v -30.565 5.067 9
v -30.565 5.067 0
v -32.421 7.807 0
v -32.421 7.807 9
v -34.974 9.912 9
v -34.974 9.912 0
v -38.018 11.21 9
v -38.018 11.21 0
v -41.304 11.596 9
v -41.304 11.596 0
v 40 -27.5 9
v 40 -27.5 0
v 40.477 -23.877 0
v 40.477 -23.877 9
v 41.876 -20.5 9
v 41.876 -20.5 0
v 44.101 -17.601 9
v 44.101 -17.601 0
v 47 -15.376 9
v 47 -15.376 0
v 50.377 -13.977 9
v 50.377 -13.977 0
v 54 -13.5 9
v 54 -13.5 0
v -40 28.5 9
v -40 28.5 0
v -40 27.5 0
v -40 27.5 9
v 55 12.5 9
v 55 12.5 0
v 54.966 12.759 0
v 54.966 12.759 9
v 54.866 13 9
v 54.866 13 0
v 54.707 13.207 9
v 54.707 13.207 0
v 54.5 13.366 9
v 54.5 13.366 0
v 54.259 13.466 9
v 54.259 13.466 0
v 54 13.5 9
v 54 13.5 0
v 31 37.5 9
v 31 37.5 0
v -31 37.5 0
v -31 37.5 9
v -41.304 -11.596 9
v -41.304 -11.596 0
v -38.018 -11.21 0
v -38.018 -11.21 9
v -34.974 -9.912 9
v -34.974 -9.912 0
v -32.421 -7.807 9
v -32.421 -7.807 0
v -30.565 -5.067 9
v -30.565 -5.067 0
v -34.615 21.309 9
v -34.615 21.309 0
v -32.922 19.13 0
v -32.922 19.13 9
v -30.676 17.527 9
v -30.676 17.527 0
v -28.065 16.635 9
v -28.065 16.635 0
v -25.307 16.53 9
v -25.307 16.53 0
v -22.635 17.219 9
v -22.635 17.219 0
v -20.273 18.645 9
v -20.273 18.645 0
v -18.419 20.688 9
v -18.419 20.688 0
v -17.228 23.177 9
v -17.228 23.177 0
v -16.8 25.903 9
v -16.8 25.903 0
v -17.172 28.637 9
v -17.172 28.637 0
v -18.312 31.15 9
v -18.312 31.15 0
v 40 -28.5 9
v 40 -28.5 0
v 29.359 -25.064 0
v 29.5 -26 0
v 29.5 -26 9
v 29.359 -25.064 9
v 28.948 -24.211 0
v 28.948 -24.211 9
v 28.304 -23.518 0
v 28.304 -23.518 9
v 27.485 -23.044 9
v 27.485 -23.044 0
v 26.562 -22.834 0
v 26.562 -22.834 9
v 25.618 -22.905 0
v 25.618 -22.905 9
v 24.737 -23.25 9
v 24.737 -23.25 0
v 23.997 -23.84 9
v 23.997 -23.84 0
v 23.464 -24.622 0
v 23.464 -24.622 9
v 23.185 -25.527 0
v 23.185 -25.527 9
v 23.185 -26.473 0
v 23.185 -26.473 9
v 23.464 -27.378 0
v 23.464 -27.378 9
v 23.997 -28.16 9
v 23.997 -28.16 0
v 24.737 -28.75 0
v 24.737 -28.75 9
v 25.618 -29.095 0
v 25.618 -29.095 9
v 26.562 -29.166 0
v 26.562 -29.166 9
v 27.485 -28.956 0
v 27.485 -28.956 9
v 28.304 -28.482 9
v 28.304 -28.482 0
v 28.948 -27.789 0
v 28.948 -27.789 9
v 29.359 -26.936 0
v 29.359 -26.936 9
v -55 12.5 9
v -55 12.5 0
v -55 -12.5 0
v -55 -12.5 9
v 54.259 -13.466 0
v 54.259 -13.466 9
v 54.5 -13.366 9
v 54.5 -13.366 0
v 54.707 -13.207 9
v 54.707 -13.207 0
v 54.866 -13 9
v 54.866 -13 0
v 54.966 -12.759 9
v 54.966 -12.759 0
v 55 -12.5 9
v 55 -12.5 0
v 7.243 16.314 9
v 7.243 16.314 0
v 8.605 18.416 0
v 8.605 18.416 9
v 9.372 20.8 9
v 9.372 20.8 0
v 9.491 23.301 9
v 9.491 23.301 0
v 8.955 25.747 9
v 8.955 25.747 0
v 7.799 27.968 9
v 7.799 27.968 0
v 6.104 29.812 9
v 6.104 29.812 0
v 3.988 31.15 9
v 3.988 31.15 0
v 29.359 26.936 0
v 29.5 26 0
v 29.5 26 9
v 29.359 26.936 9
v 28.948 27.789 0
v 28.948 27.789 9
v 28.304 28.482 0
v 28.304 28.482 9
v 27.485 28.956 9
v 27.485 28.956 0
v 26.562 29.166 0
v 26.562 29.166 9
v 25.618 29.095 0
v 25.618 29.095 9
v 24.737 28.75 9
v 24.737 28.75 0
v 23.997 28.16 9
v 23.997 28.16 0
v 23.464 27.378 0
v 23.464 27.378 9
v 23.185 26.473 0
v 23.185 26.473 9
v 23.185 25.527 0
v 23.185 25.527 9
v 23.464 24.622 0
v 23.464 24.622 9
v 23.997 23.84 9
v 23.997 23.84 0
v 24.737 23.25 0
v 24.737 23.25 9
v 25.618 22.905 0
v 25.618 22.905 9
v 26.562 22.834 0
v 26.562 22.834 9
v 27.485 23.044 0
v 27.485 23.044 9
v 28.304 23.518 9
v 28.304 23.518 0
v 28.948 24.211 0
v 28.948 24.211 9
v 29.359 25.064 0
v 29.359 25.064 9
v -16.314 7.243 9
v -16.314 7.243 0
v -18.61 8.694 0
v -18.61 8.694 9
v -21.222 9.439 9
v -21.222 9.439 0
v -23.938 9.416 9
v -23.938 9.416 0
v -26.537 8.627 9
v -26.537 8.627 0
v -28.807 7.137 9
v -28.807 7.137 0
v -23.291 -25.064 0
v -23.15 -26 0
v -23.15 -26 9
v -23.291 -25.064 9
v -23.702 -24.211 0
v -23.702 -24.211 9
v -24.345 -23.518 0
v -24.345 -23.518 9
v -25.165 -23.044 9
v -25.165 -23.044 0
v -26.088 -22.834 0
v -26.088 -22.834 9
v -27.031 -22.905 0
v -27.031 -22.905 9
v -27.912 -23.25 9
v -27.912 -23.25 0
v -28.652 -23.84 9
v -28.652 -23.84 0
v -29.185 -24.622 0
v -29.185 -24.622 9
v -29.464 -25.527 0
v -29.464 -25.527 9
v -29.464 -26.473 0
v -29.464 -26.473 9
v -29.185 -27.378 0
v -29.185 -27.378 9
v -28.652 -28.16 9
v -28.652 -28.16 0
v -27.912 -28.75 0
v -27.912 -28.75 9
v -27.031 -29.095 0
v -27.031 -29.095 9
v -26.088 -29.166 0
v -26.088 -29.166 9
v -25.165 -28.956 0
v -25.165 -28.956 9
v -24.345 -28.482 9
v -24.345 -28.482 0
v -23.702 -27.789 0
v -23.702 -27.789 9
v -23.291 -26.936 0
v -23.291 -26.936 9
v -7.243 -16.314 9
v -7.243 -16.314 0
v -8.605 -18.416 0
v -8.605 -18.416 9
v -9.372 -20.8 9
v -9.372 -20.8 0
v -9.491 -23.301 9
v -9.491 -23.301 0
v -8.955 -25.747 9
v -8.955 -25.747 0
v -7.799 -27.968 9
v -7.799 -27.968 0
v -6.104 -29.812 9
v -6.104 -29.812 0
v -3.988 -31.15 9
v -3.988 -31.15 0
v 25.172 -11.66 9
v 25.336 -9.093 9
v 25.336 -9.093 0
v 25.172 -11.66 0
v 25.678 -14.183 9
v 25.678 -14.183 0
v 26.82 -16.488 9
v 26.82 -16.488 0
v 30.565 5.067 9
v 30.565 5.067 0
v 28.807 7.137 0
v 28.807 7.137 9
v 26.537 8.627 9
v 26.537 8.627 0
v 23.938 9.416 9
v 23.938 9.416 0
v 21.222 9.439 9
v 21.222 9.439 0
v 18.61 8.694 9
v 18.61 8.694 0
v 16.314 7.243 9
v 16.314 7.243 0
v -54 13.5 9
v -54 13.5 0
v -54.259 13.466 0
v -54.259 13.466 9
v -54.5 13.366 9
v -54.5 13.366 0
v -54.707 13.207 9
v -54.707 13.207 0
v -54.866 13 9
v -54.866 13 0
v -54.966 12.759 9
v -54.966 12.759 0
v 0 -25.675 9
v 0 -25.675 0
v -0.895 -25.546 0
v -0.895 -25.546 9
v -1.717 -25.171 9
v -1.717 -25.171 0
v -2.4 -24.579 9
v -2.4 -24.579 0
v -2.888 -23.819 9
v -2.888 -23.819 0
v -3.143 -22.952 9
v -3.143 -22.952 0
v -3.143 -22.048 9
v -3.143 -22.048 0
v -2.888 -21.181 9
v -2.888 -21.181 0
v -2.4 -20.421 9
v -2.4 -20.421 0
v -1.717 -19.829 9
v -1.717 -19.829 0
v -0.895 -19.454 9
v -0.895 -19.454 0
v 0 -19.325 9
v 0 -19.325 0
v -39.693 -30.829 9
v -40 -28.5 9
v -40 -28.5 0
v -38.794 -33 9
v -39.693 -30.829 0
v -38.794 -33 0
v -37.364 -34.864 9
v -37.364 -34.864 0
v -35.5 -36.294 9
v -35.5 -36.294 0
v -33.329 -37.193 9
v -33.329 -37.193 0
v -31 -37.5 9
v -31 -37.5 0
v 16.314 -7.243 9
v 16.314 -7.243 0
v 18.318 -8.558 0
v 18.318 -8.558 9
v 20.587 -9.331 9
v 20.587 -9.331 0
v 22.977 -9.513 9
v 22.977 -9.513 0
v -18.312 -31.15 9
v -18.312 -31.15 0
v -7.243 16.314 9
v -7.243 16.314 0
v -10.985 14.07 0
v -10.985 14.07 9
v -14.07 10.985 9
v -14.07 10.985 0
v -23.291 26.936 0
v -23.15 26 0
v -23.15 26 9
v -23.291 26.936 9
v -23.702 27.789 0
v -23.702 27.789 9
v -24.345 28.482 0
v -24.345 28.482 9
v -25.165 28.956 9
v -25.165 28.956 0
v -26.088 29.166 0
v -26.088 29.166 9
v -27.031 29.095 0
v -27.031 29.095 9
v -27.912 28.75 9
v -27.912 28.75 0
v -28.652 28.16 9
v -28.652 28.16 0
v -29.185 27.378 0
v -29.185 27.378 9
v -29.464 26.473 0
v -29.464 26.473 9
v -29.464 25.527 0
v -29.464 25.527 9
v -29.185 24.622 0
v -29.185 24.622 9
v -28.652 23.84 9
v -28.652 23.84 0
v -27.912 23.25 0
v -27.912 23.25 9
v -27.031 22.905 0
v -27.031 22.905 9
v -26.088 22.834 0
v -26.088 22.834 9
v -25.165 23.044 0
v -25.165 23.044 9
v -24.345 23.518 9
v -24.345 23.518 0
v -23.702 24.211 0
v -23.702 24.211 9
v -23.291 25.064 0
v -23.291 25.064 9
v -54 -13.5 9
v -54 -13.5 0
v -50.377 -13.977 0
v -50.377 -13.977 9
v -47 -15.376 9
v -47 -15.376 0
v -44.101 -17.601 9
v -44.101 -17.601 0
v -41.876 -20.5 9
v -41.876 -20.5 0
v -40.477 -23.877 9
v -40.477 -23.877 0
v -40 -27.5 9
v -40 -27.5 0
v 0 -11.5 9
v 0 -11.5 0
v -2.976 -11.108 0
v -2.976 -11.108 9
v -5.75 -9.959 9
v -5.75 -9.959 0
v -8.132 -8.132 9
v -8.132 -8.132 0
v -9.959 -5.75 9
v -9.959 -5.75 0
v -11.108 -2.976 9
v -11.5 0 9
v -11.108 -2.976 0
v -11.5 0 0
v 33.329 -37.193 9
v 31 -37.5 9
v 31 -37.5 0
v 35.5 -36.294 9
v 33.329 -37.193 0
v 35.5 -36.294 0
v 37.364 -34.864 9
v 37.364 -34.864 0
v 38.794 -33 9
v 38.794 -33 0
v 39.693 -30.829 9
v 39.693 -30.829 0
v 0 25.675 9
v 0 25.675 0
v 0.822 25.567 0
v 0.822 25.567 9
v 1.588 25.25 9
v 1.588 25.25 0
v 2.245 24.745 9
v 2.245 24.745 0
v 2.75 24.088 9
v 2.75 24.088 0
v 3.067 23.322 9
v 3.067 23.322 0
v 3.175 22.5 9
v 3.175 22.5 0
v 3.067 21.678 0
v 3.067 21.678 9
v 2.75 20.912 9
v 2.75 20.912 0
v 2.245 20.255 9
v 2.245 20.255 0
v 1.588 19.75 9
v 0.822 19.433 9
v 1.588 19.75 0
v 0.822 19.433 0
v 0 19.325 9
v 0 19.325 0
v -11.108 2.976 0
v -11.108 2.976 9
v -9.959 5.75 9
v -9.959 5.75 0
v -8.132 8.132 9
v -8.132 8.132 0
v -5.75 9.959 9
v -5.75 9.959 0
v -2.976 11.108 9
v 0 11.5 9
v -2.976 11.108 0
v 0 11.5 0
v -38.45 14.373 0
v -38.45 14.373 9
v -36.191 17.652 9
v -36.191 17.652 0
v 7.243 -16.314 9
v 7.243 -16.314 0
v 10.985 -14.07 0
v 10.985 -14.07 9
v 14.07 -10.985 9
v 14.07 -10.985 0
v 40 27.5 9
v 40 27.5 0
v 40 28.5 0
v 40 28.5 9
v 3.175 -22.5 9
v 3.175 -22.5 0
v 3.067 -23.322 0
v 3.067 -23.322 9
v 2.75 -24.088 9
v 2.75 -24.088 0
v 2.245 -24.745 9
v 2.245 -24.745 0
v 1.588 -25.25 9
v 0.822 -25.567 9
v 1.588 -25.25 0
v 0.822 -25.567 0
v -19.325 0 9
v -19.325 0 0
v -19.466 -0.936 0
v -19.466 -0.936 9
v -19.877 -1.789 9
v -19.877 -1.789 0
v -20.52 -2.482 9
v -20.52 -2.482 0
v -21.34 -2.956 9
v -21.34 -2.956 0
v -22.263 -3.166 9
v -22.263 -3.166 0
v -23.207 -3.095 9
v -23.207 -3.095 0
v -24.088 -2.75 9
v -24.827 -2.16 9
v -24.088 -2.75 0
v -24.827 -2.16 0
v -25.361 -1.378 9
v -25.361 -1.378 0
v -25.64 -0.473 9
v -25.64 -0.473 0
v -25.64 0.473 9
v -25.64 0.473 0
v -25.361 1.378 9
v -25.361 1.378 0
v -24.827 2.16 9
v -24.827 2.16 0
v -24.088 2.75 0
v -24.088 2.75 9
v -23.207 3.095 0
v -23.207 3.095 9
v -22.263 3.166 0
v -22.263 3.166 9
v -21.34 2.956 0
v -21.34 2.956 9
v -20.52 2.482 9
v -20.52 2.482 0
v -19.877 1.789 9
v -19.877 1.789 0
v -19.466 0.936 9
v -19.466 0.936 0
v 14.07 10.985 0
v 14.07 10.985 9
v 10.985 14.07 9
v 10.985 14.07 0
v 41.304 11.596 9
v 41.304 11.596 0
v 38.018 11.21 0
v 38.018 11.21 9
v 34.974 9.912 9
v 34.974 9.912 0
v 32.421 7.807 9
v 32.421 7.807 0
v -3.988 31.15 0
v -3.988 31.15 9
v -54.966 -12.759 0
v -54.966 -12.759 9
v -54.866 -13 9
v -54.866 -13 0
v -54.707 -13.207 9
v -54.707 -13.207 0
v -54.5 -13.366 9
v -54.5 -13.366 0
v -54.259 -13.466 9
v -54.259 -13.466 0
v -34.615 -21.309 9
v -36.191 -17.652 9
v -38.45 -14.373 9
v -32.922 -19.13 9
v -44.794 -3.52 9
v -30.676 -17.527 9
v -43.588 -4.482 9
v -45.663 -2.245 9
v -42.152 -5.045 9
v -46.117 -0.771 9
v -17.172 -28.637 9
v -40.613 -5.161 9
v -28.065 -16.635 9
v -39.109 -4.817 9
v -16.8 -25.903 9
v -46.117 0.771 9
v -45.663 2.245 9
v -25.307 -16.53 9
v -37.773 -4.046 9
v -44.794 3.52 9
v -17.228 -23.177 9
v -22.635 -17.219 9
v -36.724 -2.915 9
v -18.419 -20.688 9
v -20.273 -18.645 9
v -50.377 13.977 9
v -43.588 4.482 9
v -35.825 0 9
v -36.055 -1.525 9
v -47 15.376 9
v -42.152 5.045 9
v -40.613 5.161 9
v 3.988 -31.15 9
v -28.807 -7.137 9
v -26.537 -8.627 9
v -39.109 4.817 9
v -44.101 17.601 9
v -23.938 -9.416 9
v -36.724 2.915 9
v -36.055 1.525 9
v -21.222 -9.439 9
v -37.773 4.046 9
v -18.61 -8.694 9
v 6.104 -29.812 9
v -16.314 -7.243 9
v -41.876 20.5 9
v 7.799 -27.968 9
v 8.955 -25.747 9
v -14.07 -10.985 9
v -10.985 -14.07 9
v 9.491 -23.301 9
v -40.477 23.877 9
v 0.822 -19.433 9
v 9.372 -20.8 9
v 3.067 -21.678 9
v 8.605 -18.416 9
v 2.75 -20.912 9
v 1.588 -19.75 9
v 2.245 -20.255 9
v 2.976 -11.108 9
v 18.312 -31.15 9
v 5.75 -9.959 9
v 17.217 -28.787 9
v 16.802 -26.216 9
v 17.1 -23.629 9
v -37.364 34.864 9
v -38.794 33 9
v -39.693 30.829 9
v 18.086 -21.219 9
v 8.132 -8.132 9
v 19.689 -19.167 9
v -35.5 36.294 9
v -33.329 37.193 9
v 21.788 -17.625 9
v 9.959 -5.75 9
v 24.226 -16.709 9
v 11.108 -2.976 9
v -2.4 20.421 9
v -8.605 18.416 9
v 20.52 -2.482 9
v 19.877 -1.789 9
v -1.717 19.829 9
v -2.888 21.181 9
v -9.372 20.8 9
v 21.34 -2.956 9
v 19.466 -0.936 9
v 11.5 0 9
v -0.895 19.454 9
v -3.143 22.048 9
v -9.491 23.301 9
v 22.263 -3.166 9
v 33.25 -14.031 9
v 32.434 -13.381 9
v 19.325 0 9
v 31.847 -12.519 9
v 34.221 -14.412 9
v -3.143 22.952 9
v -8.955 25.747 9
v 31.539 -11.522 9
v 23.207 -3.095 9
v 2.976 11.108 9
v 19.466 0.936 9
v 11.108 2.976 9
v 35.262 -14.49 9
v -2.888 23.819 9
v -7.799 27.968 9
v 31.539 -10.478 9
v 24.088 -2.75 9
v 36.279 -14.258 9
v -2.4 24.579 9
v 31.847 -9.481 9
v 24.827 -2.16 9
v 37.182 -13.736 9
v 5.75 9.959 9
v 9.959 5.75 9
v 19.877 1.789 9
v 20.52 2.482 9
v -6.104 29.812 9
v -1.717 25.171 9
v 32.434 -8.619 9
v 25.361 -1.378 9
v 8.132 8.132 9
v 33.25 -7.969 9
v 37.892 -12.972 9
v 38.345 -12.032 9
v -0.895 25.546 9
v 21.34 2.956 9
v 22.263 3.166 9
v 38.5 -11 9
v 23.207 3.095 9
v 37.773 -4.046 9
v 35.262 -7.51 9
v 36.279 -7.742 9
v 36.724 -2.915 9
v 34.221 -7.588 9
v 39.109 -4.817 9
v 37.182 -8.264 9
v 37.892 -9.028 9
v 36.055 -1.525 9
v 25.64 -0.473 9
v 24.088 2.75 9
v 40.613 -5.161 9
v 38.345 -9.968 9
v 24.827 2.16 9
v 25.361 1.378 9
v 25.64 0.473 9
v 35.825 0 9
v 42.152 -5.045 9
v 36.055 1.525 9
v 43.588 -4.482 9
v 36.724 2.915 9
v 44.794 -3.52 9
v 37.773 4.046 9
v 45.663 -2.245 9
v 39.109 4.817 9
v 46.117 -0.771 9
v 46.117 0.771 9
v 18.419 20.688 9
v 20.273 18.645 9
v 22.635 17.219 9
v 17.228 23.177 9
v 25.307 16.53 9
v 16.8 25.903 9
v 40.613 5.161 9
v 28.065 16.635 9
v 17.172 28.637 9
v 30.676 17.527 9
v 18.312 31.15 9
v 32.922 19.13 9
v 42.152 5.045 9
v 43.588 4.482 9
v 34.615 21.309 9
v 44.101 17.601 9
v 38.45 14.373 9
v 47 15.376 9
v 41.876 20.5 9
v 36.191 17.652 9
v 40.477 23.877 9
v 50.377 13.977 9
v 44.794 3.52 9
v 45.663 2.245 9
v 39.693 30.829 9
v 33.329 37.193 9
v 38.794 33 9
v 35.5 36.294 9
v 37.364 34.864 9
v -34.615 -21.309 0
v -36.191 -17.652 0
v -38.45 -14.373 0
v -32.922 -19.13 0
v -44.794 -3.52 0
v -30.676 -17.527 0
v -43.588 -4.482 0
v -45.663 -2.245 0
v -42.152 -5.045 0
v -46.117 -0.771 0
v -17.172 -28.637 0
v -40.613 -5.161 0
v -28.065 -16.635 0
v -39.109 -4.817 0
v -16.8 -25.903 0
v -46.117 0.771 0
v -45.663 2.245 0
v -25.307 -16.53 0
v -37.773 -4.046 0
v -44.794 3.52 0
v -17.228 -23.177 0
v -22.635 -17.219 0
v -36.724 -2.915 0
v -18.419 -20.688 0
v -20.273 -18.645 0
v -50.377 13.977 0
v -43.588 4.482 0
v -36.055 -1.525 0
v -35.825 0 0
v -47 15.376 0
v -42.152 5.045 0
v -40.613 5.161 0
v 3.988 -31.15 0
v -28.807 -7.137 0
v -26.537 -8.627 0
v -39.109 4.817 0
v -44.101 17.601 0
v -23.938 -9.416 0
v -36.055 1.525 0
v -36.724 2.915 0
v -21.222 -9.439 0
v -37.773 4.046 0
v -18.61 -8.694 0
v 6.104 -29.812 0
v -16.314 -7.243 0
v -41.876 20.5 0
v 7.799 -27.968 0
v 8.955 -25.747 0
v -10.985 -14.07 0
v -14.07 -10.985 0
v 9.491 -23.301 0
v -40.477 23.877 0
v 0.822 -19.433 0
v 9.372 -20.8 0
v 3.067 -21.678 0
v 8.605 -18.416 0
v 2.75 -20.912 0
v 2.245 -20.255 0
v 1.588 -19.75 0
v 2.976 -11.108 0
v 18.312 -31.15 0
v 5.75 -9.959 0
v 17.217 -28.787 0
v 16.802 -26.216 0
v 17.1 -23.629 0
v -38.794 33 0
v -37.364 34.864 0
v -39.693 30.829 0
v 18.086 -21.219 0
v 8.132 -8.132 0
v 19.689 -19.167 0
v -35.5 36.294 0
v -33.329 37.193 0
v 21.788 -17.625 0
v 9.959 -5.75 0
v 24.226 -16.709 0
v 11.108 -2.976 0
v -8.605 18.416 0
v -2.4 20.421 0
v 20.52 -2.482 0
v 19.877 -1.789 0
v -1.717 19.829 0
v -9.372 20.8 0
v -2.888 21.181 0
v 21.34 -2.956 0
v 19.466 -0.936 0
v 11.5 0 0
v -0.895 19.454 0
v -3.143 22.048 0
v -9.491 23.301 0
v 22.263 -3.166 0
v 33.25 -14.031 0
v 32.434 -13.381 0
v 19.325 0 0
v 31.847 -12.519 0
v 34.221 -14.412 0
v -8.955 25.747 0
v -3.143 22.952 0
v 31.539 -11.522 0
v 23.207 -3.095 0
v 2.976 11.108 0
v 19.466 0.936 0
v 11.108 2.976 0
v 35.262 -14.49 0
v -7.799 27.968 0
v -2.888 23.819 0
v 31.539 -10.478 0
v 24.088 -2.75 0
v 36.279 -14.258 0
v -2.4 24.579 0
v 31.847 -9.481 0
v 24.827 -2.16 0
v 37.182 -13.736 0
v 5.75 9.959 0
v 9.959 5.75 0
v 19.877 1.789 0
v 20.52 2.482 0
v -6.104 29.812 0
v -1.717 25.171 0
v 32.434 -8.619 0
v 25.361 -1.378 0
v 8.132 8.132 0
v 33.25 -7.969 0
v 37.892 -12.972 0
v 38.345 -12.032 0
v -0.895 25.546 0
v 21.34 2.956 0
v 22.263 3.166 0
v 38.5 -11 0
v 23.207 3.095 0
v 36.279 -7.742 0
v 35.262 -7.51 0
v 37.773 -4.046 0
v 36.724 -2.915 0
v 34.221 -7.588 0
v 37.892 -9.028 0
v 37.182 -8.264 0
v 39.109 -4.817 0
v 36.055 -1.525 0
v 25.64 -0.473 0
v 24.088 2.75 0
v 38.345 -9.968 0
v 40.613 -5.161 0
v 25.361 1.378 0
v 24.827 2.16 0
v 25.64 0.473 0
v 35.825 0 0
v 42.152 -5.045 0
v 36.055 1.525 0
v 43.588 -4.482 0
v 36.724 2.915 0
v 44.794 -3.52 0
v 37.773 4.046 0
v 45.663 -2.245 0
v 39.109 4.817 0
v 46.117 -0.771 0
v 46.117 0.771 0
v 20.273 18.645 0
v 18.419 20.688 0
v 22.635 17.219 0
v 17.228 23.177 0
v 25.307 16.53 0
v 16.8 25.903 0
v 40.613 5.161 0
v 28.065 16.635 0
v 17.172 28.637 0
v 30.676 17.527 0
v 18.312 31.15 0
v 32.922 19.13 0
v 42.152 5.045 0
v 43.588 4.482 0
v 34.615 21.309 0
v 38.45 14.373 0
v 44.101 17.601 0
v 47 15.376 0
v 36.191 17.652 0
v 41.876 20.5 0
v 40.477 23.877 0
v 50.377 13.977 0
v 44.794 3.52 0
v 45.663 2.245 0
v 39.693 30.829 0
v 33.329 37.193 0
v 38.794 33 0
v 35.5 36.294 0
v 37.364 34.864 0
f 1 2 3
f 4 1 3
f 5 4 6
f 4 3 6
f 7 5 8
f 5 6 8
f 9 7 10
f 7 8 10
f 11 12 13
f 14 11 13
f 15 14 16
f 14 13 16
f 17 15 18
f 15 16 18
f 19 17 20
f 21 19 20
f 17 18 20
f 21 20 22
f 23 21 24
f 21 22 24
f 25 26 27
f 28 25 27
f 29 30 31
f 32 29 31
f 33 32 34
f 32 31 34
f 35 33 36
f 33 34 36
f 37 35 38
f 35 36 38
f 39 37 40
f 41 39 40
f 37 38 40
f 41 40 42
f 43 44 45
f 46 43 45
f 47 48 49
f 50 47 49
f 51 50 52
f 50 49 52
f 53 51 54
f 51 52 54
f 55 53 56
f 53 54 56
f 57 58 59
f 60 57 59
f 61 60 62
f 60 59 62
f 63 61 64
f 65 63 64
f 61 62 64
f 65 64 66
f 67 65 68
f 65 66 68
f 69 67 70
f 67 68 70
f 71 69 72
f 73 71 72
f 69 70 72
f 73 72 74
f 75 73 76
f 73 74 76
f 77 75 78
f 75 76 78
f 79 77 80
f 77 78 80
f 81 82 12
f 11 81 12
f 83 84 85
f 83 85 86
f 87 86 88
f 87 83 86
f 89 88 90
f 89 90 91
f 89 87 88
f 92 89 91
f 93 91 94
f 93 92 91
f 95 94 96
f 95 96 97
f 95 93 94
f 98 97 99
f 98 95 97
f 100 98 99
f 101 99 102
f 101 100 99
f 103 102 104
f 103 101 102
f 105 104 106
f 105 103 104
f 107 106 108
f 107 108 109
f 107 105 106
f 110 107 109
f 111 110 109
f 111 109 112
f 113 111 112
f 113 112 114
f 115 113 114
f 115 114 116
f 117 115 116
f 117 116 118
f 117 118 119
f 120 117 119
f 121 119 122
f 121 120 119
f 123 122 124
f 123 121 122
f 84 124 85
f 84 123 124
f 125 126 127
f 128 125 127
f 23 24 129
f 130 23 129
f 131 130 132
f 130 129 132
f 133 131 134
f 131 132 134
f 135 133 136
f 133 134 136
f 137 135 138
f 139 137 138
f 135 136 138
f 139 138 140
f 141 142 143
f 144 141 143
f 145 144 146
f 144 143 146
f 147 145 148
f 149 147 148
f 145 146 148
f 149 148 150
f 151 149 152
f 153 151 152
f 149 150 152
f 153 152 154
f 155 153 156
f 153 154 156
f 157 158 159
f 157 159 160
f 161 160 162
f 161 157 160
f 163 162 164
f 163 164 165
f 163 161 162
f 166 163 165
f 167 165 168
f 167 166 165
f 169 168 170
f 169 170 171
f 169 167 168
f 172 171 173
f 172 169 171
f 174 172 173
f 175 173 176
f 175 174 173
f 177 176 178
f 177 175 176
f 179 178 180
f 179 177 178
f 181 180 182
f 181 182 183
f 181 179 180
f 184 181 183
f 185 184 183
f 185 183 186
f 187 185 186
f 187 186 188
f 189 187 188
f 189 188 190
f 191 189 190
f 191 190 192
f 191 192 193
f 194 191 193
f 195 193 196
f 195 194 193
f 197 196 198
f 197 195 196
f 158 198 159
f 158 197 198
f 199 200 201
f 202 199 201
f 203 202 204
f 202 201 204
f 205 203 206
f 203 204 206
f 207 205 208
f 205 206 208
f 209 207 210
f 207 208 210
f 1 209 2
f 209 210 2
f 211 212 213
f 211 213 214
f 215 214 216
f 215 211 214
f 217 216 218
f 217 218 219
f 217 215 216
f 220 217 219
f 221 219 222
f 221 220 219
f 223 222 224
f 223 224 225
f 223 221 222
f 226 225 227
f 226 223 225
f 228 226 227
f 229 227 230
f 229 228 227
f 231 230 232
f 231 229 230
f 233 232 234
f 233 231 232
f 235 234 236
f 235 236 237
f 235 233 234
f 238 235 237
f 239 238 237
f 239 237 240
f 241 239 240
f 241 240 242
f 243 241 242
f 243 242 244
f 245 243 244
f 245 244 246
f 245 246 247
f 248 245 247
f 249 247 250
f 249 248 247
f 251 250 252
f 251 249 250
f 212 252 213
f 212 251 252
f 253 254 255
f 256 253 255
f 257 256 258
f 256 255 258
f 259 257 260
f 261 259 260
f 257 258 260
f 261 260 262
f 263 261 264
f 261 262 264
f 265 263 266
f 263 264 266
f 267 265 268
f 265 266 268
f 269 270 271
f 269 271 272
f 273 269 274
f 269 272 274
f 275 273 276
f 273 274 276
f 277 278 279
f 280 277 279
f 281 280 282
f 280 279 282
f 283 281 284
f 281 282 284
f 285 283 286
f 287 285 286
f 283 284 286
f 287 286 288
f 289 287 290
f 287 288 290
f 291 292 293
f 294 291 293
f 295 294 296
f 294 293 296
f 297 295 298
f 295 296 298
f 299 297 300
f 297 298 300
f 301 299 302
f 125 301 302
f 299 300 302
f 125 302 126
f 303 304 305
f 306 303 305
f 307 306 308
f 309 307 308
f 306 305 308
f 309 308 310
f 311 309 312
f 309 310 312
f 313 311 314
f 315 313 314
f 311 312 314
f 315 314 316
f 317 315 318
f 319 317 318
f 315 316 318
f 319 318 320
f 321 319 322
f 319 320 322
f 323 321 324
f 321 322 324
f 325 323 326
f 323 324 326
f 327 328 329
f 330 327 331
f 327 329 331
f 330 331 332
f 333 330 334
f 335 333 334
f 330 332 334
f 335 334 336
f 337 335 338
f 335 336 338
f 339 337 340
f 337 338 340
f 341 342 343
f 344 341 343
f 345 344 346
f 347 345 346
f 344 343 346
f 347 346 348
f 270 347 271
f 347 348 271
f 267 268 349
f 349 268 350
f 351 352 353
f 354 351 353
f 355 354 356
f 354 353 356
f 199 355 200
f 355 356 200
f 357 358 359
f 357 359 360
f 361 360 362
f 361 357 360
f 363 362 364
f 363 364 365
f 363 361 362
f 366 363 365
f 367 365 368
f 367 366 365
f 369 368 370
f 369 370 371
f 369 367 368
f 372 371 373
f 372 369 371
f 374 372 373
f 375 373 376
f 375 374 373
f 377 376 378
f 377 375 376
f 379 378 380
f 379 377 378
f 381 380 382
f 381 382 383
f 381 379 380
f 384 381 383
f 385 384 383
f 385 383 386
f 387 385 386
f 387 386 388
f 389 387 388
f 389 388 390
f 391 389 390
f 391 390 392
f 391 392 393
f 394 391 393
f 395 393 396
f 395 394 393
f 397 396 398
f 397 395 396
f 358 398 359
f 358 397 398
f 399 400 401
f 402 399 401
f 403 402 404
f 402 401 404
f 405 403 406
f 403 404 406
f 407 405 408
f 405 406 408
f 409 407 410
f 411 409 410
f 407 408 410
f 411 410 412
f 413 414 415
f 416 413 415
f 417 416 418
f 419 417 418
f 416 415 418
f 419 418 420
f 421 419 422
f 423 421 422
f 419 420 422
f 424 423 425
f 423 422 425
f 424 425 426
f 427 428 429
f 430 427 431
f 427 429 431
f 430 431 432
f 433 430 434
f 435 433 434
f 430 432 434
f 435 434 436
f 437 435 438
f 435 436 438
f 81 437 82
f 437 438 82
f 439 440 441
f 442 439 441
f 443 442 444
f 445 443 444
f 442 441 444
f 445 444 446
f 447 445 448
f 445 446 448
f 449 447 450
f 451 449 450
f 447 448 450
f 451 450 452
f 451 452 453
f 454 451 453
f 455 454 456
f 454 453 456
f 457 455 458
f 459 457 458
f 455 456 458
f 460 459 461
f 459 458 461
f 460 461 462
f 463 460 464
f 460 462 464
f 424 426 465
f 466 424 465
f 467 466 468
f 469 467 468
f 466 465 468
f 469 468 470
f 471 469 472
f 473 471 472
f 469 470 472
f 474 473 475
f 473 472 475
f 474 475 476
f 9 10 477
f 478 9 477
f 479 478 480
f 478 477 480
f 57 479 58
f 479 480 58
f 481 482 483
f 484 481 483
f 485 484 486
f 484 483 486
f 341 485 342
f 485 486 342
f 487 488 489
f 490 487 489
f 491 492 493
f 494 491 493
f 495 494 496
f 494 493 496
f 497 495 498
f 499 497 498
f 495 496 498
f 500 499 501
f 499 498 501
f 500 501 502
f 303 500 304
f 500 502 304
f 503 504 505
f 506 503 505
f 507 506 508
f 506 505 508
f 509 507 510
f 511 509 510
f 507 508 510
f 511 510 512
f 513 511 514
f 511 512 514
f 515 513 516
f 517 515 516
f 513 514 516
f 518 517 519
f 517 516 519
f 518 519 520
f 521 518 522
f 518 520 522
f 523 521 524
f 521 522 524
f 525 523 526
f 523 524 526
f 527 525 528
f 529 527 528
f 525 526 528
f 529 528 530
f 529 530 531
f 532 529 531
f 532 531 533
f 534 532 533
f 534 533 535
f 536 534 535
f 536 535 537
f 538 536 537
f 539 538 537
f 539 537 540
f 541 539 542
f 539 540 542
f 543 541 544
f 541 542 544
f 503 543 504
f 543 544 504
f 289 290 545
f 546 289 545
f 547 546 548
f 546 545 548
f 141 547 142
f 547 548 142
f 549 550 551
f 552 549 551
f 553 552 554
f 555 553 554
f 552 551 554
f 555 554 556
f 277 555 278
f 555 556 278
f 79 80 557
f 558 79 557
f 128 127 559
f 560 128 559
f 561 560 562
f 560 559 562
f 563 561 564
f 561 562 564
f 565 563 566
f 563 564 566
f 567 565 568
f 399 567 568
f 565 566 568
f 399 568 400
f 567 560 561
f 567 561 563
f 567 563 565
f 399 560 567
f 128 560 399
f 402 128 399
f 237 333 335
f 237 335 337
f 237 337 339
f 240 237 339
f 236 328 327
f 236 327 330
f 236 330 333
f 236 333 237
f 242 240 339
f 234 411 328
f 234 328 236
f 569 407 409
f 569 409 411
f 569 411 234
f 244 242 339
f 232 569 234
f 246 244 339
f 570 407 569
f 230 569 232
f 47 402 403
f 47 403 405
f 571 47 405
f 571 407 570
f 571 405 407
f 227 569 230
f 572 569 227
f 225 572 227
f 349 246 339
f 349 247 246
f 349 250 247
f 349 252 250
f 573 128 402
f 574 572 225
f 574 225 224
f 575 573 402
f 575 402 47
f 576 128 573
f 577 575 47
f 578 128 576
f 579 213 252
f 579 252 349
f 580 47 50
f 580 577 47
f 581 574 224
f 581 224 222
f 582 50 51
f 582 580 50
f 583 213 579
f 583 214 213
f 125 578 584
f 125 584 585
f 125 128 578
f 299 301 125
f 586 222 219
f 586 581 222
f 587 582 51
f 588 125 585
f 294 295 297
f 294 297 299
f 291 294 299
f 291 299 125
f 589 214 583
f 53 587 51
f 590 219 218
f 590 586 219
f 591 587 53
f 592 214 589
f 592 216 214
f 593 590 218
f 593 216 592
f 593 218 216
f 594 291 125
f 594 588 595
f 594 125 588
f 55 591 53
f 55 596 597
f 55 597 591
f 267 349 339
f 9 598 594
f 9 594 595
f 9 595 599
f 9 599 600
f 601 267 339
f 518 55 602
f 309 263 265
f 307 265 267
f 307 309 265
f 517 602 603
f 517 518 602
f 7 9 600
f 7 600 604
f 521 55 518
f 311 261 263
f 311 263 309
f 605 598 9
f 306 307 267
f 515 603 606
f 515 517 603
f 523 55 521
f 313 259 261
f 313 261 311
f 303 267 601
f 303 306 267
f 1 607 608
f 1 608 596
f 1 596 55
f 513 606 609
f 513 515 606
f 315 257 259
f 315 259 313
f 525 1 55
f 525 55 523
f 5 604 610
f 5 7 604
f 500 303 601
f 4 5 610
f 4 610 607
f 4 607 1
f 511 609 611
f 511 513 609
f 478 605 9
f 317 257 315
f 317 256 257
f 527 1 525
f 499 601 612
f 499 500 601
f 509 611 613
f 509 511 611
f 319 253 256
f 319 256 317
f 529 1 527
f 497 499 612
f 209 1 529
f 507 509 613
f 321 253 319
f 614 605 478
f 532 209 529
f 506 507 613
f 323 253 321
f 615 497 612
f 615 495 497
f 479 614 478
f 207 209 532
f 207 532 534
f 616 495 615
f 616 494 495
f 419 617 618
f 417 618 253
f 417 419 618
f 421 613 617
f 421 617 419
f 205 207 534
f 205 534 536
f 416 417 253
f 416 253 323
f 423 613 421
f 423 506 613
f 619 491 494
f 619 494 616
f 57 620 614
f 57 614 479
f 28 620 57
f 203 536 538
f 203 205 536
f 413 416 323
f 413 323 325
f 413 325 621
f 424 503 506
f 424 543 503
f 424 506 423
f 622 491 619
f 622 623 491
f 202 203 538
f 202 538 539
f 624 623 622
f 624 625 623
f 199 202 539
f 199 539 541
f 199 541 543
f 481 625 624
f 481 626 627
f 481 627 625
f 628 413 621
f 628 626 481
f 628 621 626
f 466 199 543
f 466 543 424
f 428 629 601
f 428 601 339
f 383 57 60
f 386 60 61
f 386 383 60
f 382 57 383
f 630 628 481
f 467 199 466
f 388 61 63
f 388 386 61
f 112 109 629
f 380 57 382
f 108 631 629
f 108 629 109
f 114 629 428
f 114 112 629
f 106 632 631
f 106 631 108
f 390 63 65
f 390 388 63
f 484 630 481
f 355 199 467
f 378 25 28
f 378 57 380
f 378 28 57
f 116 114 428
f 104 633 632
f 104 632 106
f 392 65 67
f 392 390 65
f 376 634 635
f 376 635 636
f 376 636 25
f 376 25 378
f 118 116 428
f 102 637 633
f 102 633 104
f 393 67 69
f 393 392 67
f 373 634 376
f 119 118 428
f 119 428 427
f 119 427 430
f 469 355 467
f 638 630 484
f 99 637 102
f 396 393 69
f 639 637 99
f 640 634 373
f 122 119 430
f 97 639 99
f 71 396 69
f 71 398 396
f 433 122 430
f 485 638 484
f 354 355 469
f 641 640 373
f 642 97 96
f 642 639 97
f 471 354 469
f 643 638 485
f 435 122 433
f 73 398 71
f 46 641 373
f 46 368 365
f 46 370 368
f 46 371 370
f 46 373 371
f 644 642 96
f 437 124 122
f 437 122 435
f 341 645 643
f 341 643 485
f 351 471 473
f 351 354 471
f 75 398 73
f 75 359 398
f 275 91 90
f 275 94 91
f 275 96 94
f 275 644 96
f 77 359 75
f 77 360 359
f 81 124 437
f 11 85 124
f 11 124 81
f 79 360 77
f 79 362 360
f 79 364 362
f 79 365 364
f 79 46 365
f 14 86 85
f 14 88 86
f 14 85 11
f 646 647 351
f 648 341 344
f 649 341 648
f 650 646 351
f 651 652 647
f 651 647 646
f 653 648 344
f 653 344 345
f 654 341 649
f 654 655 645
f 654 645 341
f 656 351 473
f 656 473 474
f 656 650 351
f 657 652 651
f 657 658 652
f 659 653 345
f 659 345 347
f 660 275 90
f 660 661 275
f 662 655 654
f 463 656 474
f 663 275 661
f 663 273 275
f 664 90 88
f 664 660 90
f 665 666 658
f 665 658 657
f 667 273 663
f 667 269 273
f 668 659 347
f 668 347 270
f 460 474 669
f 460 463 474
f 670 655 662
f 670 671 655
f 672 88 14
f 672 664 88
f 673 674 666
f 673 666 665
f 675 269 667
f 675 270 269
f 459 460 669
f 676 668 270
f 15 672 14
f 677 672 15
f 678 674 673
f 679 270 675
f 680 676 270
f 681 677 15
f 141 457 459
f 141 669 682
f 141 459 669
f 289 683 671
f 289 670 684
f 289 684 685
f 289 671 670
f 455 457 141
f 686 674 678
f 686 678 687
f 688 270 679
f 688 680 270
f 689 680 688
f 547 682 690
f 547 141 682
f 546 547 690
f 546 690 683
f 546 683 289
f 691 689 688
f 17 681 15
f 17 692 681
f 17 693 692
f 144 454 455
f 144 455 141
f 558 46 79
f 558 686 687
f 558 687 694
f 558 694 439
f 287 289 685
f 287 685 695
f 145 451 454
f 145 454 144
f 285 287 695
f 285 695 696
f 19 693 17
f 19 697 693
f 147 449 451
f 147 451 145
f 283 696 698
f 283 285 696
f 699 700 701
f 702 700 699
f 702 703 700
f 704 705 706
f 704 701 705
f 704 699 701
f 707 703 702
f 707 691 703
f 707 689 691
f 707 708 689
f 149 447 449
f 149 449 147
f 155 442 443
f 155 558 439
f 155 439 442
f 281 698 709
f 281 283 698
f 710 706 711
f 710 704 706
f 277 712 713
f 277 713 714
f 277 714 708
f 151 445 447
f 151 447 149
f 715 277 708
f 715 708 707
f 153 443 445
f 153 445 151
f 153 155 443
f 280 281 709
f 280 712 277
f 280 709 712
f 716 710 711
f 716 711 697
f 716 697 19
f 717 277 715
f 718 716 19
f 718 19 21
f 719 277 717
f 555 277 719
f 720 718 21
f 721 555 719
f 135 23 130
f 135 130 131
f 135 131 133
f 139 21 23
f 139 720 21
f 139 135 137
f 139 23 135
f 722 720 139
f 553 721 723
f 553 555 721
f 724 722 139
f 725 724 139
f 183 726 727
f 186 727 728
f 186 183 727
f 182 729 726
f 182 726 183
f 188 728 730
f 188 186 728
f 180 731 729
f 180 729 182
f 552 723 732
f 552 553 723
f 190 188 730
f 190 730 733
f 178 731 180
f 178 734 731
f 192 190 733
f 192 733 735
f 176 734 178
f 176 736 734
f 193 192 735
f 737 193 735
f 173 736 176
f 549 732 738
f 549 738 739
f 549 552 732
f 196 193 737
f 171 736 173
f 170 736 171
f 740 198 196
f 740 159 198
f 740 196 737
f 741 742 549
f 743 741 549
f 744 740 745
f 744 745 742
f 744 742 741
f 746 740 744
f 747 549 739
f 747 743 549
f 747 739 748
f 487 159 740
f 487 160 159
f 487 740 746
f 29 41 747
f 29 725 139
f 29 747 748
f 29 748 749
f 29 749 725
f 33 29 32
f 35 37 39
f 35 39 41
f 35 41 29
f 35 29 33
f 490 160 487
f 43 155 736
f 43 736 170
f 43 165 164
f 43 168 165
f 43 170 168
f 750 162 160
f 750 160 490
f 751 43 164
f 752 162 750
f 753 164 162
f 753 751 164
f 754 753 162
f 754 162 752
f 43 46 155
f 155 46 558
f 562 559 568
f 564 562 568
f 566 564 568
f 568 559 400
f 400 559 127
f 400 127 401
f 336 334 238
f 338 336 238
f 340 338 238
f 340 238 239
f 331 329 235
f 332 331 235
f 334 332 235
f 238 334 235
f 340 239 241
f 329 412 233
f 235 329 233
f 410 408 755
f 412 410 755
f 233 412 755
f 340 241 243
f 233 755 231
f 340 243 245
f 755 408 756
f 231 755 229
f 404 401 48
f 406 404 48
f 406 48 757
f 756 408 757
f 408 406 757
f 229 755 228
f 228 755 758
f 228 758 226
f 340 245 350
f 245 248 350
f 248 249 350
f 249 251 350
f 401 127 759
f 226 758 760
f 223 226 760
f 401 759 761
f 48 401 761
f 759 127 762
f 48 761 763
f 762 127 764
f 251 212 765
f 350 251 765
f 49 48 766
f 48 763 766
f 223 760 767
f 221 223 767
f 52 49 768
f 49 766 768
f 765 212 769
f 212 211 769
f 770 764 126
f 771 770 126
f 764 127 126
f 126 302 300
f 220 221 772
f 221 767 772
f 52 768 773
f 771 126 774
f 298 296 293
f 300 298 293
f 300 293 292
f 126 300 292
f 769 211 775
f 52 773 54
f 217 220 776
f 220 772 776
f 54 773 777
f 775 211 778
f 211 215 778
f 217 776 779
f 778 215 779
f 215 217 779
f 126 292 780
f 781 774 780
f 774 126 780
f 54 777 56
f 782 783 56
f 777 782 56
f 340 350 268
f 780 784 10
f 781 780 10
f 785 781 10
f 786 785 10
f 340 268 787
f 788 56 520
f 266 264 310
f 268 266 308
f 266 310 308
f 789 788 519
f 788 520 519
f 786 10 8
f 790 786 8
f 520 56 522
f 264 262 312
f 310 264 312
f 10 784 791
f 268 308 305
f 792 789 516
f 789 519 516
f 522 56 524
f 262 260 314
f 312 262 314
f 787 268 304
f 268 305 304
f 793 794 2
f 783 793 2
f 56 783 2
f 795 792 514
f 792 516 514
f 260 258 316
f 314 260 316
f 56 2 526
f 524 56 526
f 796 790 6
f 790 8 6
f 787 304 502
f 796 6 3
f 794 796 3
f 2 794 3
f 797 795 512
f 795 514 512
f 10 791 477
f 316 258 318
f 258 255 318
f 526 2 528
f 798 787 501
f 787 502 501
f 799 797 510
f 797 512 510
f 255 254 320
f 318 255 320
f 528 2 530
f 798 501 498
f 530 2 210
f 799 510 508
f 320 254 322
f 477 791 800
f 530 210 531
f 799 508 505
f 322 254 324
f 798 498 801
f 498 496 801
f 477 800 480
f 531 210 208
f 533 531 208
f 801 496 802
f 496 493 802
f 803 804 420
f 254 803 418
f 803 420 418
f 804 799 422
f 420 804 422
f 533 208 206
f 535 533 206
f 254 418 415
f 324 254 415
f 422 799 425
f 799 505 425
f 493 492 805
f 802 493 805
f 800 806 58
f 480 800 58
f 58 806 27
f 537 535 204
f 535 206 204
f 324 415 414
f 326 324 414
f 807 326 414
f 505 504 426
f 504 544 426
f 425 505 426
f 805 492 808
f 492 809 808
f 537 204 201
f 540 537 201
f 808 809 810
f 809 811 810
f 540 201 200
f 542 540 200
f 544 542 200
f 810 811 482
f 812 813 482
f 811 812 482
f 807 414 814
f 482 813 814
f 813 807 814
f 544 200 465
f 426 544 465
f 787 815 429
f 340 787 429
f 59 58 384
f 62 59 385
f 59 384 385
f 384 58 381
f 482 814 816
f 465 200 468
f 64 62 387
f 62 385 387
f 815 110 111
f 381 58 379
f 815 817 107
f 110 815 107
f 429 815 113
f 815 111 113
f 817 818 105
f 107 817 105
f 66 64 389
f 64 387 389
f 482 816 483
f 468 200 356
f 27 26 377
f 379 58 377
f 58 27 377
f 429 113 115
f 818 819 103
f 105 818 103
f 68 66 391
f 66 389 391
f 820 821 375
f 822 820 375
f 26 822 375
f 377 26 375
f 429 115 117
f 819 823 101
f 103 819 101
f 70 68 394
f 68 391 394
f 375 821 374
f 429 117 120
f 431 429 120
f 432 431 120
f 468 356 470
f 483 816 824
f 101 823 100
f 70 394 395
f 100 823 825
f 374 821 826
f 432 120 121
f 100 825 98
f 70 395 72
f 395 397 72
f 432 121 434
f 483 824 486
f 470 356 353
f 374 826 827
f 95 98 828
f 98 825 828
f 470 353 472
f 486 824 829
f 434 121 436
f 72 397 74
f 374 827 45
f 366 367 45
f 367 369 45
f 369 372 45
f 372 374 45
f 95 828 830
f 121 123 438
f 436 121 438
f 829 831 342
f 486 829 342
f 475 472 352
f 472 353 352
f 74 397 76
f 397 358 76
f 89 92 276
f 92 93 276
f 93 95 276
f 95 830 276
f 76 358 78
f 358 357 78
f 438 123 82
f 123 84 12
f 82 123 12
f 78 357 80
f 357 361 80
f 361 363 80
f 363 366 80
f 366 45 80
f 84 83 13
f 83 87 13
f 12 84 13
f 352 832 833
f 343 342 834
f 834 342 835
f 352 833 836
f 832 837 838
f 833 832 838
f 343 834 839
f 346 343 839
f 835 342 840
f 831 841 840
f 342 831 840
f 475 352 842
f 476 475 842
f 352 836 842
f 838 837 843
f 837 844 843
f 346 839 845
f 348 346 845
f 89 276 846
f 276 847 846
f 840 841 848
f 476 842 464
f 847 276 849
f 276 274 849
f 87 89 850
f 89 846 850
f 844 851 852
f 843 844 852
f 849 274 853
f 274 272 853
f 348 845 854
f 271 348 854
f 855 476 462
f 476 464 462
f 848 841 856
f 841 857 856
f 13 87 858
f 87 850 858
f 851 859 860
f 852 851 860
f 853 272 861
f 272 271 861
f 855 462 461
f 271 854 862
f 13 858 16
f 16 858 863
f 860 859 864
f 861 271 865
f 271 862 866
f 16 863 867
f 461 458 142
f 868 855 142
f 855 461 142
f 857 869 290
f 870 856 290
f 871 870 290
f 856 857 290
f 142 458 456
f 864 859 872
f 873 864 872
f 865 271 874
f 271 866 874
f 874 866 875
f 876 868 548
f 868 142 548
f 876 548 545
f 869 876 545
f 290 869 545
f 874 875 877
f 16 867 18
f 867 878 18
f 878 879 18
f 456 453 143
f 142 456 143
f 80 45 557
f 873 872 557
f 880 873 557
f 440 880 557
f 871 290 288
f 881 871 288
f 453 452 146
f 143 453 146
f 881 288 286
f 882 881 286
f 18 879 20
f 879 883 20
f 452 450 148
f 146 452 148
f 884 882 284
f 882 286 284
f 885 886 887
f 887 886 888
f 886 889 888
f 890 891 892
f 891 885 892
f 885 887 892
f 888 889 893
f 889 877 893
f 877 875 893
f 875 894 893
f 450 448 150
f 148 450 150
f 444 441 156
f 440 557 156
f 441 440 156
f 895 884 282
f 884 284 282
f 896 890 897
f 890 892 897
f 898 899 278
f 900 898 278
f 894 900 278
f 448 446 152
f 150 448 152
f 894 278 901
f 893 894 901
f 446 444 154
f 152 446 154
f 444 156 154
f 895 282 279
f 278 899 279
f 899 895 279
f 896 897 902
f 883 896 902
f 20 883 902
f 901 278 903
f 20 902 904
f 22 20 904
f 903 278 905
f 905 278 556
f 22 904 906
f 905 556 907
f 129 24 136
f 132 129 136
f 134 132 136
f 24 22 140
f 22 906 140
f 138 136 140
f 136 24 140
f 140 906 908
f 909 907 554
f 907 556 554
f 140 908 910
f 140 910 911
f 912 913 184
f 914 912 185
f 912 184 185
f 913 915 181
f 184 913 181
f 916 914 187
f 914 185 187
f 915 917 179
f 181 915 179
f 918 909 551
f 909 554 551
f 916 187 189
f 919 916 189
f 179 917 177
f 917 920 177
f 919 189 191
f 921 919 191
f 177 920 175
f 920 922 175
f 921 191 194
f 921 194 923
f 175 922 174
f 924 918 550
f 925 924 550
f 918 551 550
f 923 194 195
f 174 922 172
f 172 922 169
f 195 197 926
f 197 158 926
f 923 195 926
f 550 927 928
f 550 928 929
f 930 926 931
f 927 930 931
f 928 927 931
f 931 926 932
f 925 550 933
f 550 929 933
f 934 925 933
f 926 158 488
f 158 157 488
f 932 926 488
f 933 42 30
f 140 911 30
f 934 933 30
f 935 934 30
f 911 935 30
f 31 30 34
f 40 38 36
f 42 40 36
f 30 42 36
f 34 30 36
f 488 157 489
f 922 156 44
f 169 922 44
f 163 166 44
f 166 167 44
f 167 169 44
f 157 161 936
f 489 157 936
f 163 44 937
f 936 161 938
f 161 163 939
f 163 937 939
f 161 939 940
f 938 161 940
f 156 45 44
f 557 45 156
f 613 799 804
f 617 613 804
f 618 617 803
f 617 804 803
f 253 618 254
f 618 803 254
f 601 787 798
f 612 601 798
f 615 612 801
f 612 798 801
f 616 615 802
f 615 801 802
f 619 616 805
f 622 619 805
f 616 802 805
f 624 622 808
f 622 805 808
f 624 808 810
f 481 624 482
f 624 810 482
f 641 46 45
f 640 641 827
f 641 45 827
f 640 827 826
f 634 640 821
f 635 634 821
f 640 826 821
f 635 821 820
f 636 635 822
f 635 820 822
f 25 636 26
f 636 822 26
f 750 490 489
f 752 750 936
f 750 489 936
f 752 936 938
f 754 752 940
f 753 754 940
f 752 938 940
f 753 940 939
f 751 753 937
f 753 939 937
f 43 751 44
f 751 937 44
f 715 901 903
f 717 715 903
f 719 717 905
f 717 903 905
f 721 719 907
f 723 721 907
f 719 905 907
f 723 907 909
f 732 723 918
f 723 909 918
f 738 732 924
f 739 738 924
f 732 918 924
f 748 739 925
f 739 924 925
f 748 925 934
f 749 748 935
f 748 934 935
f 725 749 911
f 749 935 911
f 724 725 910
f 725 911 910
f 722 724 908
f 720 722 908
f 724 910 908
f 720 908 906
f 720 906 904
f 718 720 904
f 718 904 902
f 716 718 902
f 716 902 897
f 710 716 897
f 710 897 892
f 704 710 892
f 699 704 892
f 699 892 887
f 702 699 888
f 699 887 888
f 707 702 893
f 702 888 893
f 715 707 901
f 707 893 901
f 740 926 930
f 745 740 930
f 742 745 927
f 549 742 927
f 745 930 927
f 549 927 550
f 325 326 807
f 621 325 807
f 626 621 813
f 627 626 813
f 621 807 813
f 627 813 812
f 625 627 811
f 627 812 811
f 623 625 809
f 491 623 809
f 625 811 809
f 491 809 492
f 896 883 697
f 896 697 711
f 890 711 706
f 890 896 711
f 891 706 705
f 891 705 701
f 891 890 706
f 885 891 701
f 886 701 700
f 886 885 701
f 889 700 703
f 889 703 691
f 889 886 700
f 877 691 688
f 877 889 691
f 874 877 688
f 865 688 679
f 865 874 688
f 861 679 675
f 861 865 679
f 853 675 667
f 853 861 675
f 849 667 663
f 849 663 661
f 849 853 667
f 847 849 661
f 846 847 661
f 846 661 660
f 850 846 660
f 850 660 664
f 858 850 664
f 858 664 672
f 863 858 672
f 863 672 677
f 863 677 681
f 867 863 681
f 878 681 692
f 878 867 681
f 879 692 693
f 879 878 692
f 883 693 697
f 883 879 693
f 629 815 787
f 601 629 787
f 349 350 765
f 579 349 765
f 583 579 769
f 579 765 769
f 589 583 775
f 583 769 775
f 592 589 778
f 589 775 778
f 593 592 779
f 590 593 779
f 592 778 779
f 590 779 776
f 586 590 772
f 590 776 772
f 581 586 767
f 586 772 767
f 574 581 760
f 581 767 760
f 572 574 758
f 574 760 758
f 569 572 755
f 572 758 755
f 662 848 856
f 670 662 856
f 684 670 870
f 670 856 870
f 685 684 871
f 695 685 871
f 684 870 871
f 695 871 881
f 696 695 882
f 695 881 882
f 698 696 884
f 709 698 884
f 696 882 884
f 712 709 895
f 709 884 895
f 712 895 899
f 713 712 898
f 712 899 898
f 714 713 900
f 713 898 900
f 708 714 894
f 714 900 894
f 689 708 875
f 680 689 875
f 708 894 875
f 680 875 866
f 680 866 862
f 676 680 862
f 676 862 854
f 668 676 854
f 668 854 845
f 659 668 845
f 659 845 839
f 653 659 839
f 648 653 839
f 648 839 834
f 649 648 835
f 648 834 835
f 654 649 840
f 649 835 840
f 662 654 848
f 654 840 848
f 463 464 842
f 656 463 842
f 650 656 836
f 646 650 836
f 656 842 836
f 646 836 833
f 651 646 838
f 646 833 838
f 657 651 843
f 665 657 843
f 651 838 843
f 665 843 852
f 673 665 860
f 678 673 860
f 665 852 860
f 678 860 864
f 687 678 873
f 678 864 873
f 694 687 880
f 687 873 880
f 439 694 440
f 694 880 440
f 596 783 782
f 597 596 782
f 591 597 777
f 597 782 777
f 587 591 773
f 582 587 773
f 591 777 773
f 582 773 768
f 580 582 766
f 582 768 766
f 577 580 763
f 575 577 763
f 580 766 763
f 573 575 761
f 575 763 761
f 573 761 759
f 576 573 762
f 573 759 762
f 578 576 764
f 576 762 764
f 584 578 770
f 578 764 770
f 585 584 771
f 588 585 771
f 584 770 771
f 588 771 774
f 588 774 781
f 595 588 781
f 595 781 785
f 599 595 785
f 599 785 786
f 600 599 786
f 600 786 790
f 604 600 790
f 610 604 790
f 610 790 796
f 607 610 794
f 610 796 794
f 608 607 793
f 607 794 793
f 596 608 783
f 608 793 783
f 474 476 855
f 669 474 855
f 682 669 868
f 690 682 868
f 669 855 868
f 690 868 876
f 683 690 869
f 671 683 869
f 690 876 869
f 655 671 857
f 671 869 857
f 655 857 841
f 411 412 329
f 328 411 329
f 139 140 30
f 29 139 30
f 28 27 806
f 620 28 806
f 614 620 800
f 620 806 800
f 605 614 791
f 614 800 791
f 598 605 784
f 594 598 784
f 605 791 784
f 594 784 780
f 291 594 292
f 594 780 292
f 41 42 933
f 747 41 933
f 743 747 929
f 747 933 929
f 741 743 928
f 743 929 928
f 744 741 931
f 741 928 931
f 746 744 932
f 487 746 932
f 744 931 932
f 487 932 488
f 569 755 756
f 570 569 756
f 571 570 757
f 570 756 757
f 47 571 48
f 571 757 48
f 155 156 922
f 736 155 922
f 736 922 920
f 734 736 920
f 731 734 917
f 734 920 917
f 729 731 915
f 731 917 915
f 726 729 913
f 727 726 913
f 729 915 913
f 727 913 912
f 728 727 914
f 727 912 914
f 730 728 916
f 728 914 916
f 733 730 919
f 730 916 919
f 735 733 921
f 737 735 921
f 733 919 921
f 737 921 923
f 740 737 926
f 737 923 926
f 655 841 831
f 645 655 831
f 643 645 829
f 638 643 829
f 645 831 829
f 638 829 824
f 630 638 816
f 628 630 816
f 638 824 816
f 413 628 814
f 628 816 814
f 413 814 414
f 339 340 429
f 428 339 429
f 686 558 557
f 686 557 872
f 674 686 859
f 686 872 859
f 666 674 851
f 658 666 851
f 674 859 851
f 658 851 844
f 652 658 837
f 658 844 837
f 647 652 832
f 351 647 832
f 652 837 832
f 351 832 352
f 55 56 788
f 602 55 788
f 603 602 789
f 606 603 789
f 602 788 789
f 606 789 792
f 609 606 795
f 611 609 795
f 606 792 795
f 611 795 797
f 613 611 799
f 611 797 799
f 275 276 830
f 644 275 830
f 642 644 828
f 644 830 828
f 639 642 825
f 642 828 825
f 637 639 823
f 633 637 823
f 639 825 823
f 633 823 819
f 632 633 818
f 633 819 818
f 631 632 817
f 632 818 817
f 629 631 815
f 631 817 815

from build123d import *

# Parameters (mm, degrees)
F0_R     = 3.175
F0_R_2   = 3.5
F1_DEPTH = 9


# Not quite as in the source:
# - ends of sketch curves that miss each other by under 0.0002 mm in the source are joined


with BuildPart() as f1:
    # F0 (on Top) → F1 (new body)
    with BuildSketch(Plane.XY):
        with BuildLine():
            Line((0, 25.675), (0, 37.5))
            Line((0, 37.5), (-31, 37.5))
            ThreePointArc((-31, 37.5), (-37.3639610307, 34.8639610307), (-40, 28.5))
            Line((-40, 28.5), (-40, 27.5))
            ThreePointArc((-40, 27.5), (-44.1005050634, 17.6005050634), (-54, 13.5))
            ThreePointArc((-54, 13.5), (-54.7071067812, 13.2071067812), (-55, 12.5))
            Line((-55, 12.5), (-55, 0))
            Line((-55, 0), (-46.175, 0))
            ThreePointArc((-46.175, 0), (-41, 5.175), (-35.825, 0))
            Line((-35.825, 0), (-25.675, 0))
            ThreePointArc((-25.675, 0), (-22.5, 3.175), (-19.325, 0))
            Line((-19.325, 0), (-11.5, 0))
            ThreePointArc((-11.5, 0), (-8.1317279836, 8.1317279836), (0, 11.5))
            Line((0, 11.5), (0, 19.325))
            ThreePointArc((0, 19.325), (-3.175, 22.5), (0, 25.675))
        make_face()
        with BuildLine():
            ThreePointArc((-30.5652871781, 5.0672249135), (-34.9739264655, 9.9119341078), (-41.3041070016, 11.5960130619))
            ThreePointArc((-41.3041070016, 11.5960130619), (-37.2403076286, 15.9572441931), (-34.6146149846, 21.3089299951))
            ThreePointArc((-34.6146149846, 21.3089299951), (-21.4024086548, 17.845567287), (-18.3122078194, 31.1500001161))
            Line((-18.3122078194, 31.1500001161), (-3.987873, 31.15))
            ThreePointArc((-3.987873, 31.15), (-9.3036595822, 24.5414561908), (-7.2431808946, 16.31437509))
            ThreePointArc((-7.2431808946, 16.31437509), (-12.6218560442, 12.6218560442), (-16.3143749324, 7.24318097))
            ThreePointArc((-16.3143749324, 7.24318097), (-23.9376990029, 9.4158720561), (-30.5652871781, 5.0672249135))
        make_face(mode=Mode.SUBTRACT)
        with Locations((-26.324893, 26)):
            Circle(F0_R, mode=Mode.SUBTRACT)
        with BuildLine():
            ThreePointArc((0, -11.5), (-8.1317279836, -8.1317279836), (-11.5, 0))
            Line((-11.5, 0), (-19.325, 0))
            ThreePointArc((-19.325, 0), (-22.5, -3.175), (-25.675, 0))
            Line((-25.675, 0), (-35.825, 0))
            ThreePointArc((-35.825, 0), (-41, -5.175), (-46.175, 0))
            Line((-46.175, 0), (-55, 0))
            Line((-55, 0), (-55, -12.5))
            ThreePointArc((-55, -12.5), (-54.7071067812, -13.2071067812), (-54, -13.5))
            ThreePointArc((-54, -13.5), (-44.1005050634, -17.6005050634), (-40, -27.5))
            Line((-40, -27.5), (-40, -28.5))
            ThreePointArc((-40, -28.5), (-37.3639610307, -34.8639610307), (-31, -37.5))
            Line((-31, -37.5), (0, -37.5))
            Line((0, -37.5), (0, -25.675))
            ThreePointArc((0, -25.675), (-3.175, -22.5), (0, -19.325))
            Line((0, -19.325), (0, -11.5))
        make_face()
        with Locations((-26.324893, -26)):
            Circle(F0_R, mode=Mode.SUBTRACT)
        with BuildLine():
            ThreePointArc((-34.6146149846, -21.3089299951), (-37.2403076286, -15.9572441931), (-41.304107024, -11.59601303))
            ThreePointArc((-41.304107024, -11.59601303), (-34.9739264655, -9.9119341078), (-30.5652871781, -5.0672249135))
            ThreePointArc((-30.5652871781, -5.0672249135), (-23.9376990029, -9.4158720561), (-16.31437509, -7.2431808946))
            ThreePointArc((-16.31437509, -7.2431808946), (-12.6218560442, -12.6218560442), (-7.24318097, -16.3143749324))
            ThreePointArc((-7.24318097, -16.3143749324), (-9.3036595822, -24.5414561908), (-3.9878728667, -31.1499997109))
            Line((-3.9878728667, -31.1499997109), (-18.312208, -31.15))
            ThreePointArc((-18.312208, -31.15), (-21.4024086548, -17.845567287), (-34.6146149846, -21.3089299951))
        make_face(mode=Mode.SUBTRACT)
        with BuildLine():
            Line((19.325, 0), (11.5, 0))
            ThreePointArc((11.5, 0), (8.1317279836, -8.1317279836), (0, -11.5))
            Line((0, -11.5), (0, -19.325))
            ThreePointArc((0, -19.325), (2.2450640303, -20.2549359697), (3.175, -22.5))
            ThreePointArc((3.175, -22.5), (2.2450640303, -24.7450640303), (0, -25.675))
            Line((0, -25.675), (0, -37.5))
            Line((0, -37.5), (31, -37.5))
            ThreePointArc((31, -37.5), (37.3639610307, -34.8639610307), (40, -28.5))
            Line((40, -28.5), (40, -27.5))
            ThreePointArc((40, -27.5), (44.1005050634, -17.6005050634), (54, -13.5))
            ThreePointArc((54, -13.5), (54.7071067812, -13.2071067812), (55, -12.5))
            Line((55, -12.5), (55, 0))
            Line((55, 0), (46.175, 0))
            ThreePointArc((46.175, 0), (41, -5.175), (35.825, 0))
            Line((35.825, 0), (25.675, 0))
            ThreePointArc((25.675, 0), (22.5, -3.175), (19.325, 0))
        make_face()
        with Locations((26.324893, -26)):
            Circle(F0_R, mode=Mode.SUBTRACT)
        with BuildLine():
            ThreePointArc((7.24318097, -16.3143749324), (12.6218560442, -12.6218560442), (16.3143749324, -7.24318097))
            ThreePointArc((16.3143749324, -7.24318097), (20.5869660419, -9.3309123924), (25.3363869117, -9.0928837168))
            ThreePointArc((25.3363869117, -9.0928837168), (25.3425465049, -12.93806398), (26.8204236463, -16.4878985664))
            ThreePointArc((26.8204236463, -16.4878985664), (18.0864944073, -21.2193710008), (18.3122078194, -31.1500001161))
            Line((18.3122078194, -31.1500001161), (3.987872, -31.15))
            ThreePointArc((3.987872, -31.15), (9.3036594849, -24.5414566343), (7.24318097, -16.3143749324))
        make_face(mode=Mode.SUBTRACT)
        with Locations((35, -11)):
            Circle(F0_R_2, mode=Mode.SUBTRACT)
        with BuildLine():
            Line((31, 37.5), (0, 37.5))
            Line((0, 37.5), (0, 25.675))
            ThreePointArc((0, 25.675), (2.2450640303, 24.7450640303), (3.175, 22.5))
            ThreePointArc((3.175, 22.5), (2.2450640303, 20.2549359697), (0, 19.325))
            Line((0, 19.325), (0, 11.5))
            ThreePointArc((0, 11.5), (8.1317279836, 8.1317279836), (11.5, 0))
            Line((11.5, 0), (19.325, 0))
            ThreePointArc((19.325, 0), (22.5, 3.175), (25.675, 0))
            Line((25.675, 0), (35.825, 0))
            ThreePointArc((35.825, 0), (41, 5.175), (46.175, 0))
            Line((46.175, 0), (55, 0))
            Line((55, 0), (55, 12.5))
            ThreePointArc((55, 12.5), (54.7071067812, 13.2071067812), (54, 13.5))
            ThreePointArc((54, 13.5), (44.1005050634, 17.6005050634), (40, 27.5))
            Line((40, 27.5), (40, 28.5))
            ThreePointArc((40, 28.5), (37.3639610307, 34.8639610307), (31, 37.5))
        make_face()
        with BuildLine():
            ThreePointArc((30.5652870625, 5.0672250393), (23.9376990029, 9.4158720561), (16.31437509, 7.2431808946))
            ThreePointArc((16.31437509, 7.2431808946), (12.6218560442, 12.6218560442), (7.24318097, 16.3143749324))
            ThreePointArc((7.24318097, 16.3143749324), (9.3036594849, 24.5414566343), (3.987872042, 31.1500000911))
            Line((3.987872042, 31.1500000911), (18.312208, 31.15))
            ThreePointArc((18.312208, 31.15), (21.4024086548, 17.845567287), (34.6146148363, 21.3089300926))
            ThreePointArc((34.6146148363, 21.3089300926), (37.2403076286, 15.9572441931), (41.304107024, 11.59601303))
            ThreePointArc((41.304107024, 11.59601303), (34.9739264655, 9.9119341078), (30.5652870625, 5.0672250393))
        make_face(mode=Mode.SUBTRACT)
        with Locations((26.324893, 26)):
            Circle(F0_R, mode=Mode.SUBTRACT)
    extrude(amount=F1_DEPTH)


solid = f1.part
